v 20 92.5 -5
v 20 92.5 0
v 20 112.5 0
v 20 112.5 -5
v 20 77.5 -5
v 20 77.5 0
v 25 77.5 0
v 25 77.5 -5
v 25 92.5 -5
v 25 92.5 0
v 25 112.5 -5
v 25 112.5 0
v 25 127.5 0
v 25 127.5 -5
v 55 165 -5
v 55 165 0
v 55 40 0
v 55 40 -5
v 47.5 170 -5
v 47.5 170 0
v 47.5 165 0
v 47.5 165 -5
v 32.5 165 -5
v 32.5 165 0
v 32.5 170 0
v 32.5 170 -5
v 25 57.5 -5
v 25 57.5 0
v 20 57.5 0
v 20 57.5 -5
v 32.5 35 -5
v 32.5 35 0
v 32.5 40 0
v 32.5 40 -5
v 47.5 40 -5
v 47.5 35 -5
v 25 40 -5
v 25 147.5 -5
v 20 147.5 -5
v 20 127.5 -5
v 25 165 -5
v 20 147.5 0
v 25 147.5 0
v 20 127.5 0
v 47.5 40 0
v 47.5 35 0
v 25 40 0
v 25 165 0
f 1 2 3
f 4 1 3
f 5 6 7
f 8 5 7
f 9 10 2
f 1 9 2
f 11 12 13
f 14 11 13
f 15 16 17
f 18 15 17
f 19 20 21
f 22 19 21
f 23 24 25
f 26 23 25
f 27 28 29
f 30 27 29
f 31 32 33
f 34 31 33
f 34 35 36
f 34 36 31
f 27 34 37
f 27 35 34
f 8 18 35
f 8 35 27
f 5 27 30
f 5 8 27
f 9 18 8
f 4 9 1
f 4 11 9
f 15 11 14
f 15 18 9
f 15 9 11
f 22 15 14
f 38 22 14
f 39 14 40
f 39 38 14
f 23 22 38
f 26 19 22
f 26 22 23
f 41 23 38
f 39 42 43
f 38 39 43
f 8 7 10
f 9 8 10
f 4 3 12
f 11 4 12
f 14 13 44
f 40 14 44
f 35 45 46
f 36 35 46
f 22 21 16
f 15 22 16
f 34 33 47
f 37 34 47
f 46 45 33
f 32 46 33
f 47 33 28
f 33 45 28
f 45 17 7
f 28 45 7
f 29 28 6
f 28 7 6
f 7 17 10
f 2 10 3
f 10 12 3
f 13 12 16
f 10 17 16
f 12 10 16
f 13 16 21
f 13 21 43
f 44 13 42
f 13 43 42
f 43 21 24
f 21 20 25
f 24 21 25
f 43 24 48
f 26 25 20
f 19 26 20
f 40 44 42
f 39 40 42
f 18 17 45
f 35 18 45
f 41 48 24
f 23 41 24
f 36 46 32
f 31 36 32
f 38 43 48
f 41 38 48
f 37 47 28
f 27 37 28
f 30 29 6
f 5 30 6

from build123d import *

# Parameters (mm, degrees)
BOSS_EXTRUDE1_DEPTH = 5


with BuildPart() as part:
    # Sketch1 → Boss-Extrude1 (new body)
    with BuildSketch(Plane.XY):
        Polygon((25, 127.5), (20, 127.5), (20, 147.5), (25, 147.5), (25, 165), (32.5, 165), (32.5, 170), (47.5, 170), (47.5, 165), (55, 165), (55, 40), (47.5, 40), (47.5, 35), (32.5, 35), (32.5, 40), (25, 40), (25, 57.5), (20, 57.5), (20, 77.5), (25, 77.5), (25, 92.5), (20, 92.5), (20, 112.5), (25, 112.5), align=None)
    extrude(amount=-BOSS_EXTRUDE1_DEPTH)


solid = part.part
